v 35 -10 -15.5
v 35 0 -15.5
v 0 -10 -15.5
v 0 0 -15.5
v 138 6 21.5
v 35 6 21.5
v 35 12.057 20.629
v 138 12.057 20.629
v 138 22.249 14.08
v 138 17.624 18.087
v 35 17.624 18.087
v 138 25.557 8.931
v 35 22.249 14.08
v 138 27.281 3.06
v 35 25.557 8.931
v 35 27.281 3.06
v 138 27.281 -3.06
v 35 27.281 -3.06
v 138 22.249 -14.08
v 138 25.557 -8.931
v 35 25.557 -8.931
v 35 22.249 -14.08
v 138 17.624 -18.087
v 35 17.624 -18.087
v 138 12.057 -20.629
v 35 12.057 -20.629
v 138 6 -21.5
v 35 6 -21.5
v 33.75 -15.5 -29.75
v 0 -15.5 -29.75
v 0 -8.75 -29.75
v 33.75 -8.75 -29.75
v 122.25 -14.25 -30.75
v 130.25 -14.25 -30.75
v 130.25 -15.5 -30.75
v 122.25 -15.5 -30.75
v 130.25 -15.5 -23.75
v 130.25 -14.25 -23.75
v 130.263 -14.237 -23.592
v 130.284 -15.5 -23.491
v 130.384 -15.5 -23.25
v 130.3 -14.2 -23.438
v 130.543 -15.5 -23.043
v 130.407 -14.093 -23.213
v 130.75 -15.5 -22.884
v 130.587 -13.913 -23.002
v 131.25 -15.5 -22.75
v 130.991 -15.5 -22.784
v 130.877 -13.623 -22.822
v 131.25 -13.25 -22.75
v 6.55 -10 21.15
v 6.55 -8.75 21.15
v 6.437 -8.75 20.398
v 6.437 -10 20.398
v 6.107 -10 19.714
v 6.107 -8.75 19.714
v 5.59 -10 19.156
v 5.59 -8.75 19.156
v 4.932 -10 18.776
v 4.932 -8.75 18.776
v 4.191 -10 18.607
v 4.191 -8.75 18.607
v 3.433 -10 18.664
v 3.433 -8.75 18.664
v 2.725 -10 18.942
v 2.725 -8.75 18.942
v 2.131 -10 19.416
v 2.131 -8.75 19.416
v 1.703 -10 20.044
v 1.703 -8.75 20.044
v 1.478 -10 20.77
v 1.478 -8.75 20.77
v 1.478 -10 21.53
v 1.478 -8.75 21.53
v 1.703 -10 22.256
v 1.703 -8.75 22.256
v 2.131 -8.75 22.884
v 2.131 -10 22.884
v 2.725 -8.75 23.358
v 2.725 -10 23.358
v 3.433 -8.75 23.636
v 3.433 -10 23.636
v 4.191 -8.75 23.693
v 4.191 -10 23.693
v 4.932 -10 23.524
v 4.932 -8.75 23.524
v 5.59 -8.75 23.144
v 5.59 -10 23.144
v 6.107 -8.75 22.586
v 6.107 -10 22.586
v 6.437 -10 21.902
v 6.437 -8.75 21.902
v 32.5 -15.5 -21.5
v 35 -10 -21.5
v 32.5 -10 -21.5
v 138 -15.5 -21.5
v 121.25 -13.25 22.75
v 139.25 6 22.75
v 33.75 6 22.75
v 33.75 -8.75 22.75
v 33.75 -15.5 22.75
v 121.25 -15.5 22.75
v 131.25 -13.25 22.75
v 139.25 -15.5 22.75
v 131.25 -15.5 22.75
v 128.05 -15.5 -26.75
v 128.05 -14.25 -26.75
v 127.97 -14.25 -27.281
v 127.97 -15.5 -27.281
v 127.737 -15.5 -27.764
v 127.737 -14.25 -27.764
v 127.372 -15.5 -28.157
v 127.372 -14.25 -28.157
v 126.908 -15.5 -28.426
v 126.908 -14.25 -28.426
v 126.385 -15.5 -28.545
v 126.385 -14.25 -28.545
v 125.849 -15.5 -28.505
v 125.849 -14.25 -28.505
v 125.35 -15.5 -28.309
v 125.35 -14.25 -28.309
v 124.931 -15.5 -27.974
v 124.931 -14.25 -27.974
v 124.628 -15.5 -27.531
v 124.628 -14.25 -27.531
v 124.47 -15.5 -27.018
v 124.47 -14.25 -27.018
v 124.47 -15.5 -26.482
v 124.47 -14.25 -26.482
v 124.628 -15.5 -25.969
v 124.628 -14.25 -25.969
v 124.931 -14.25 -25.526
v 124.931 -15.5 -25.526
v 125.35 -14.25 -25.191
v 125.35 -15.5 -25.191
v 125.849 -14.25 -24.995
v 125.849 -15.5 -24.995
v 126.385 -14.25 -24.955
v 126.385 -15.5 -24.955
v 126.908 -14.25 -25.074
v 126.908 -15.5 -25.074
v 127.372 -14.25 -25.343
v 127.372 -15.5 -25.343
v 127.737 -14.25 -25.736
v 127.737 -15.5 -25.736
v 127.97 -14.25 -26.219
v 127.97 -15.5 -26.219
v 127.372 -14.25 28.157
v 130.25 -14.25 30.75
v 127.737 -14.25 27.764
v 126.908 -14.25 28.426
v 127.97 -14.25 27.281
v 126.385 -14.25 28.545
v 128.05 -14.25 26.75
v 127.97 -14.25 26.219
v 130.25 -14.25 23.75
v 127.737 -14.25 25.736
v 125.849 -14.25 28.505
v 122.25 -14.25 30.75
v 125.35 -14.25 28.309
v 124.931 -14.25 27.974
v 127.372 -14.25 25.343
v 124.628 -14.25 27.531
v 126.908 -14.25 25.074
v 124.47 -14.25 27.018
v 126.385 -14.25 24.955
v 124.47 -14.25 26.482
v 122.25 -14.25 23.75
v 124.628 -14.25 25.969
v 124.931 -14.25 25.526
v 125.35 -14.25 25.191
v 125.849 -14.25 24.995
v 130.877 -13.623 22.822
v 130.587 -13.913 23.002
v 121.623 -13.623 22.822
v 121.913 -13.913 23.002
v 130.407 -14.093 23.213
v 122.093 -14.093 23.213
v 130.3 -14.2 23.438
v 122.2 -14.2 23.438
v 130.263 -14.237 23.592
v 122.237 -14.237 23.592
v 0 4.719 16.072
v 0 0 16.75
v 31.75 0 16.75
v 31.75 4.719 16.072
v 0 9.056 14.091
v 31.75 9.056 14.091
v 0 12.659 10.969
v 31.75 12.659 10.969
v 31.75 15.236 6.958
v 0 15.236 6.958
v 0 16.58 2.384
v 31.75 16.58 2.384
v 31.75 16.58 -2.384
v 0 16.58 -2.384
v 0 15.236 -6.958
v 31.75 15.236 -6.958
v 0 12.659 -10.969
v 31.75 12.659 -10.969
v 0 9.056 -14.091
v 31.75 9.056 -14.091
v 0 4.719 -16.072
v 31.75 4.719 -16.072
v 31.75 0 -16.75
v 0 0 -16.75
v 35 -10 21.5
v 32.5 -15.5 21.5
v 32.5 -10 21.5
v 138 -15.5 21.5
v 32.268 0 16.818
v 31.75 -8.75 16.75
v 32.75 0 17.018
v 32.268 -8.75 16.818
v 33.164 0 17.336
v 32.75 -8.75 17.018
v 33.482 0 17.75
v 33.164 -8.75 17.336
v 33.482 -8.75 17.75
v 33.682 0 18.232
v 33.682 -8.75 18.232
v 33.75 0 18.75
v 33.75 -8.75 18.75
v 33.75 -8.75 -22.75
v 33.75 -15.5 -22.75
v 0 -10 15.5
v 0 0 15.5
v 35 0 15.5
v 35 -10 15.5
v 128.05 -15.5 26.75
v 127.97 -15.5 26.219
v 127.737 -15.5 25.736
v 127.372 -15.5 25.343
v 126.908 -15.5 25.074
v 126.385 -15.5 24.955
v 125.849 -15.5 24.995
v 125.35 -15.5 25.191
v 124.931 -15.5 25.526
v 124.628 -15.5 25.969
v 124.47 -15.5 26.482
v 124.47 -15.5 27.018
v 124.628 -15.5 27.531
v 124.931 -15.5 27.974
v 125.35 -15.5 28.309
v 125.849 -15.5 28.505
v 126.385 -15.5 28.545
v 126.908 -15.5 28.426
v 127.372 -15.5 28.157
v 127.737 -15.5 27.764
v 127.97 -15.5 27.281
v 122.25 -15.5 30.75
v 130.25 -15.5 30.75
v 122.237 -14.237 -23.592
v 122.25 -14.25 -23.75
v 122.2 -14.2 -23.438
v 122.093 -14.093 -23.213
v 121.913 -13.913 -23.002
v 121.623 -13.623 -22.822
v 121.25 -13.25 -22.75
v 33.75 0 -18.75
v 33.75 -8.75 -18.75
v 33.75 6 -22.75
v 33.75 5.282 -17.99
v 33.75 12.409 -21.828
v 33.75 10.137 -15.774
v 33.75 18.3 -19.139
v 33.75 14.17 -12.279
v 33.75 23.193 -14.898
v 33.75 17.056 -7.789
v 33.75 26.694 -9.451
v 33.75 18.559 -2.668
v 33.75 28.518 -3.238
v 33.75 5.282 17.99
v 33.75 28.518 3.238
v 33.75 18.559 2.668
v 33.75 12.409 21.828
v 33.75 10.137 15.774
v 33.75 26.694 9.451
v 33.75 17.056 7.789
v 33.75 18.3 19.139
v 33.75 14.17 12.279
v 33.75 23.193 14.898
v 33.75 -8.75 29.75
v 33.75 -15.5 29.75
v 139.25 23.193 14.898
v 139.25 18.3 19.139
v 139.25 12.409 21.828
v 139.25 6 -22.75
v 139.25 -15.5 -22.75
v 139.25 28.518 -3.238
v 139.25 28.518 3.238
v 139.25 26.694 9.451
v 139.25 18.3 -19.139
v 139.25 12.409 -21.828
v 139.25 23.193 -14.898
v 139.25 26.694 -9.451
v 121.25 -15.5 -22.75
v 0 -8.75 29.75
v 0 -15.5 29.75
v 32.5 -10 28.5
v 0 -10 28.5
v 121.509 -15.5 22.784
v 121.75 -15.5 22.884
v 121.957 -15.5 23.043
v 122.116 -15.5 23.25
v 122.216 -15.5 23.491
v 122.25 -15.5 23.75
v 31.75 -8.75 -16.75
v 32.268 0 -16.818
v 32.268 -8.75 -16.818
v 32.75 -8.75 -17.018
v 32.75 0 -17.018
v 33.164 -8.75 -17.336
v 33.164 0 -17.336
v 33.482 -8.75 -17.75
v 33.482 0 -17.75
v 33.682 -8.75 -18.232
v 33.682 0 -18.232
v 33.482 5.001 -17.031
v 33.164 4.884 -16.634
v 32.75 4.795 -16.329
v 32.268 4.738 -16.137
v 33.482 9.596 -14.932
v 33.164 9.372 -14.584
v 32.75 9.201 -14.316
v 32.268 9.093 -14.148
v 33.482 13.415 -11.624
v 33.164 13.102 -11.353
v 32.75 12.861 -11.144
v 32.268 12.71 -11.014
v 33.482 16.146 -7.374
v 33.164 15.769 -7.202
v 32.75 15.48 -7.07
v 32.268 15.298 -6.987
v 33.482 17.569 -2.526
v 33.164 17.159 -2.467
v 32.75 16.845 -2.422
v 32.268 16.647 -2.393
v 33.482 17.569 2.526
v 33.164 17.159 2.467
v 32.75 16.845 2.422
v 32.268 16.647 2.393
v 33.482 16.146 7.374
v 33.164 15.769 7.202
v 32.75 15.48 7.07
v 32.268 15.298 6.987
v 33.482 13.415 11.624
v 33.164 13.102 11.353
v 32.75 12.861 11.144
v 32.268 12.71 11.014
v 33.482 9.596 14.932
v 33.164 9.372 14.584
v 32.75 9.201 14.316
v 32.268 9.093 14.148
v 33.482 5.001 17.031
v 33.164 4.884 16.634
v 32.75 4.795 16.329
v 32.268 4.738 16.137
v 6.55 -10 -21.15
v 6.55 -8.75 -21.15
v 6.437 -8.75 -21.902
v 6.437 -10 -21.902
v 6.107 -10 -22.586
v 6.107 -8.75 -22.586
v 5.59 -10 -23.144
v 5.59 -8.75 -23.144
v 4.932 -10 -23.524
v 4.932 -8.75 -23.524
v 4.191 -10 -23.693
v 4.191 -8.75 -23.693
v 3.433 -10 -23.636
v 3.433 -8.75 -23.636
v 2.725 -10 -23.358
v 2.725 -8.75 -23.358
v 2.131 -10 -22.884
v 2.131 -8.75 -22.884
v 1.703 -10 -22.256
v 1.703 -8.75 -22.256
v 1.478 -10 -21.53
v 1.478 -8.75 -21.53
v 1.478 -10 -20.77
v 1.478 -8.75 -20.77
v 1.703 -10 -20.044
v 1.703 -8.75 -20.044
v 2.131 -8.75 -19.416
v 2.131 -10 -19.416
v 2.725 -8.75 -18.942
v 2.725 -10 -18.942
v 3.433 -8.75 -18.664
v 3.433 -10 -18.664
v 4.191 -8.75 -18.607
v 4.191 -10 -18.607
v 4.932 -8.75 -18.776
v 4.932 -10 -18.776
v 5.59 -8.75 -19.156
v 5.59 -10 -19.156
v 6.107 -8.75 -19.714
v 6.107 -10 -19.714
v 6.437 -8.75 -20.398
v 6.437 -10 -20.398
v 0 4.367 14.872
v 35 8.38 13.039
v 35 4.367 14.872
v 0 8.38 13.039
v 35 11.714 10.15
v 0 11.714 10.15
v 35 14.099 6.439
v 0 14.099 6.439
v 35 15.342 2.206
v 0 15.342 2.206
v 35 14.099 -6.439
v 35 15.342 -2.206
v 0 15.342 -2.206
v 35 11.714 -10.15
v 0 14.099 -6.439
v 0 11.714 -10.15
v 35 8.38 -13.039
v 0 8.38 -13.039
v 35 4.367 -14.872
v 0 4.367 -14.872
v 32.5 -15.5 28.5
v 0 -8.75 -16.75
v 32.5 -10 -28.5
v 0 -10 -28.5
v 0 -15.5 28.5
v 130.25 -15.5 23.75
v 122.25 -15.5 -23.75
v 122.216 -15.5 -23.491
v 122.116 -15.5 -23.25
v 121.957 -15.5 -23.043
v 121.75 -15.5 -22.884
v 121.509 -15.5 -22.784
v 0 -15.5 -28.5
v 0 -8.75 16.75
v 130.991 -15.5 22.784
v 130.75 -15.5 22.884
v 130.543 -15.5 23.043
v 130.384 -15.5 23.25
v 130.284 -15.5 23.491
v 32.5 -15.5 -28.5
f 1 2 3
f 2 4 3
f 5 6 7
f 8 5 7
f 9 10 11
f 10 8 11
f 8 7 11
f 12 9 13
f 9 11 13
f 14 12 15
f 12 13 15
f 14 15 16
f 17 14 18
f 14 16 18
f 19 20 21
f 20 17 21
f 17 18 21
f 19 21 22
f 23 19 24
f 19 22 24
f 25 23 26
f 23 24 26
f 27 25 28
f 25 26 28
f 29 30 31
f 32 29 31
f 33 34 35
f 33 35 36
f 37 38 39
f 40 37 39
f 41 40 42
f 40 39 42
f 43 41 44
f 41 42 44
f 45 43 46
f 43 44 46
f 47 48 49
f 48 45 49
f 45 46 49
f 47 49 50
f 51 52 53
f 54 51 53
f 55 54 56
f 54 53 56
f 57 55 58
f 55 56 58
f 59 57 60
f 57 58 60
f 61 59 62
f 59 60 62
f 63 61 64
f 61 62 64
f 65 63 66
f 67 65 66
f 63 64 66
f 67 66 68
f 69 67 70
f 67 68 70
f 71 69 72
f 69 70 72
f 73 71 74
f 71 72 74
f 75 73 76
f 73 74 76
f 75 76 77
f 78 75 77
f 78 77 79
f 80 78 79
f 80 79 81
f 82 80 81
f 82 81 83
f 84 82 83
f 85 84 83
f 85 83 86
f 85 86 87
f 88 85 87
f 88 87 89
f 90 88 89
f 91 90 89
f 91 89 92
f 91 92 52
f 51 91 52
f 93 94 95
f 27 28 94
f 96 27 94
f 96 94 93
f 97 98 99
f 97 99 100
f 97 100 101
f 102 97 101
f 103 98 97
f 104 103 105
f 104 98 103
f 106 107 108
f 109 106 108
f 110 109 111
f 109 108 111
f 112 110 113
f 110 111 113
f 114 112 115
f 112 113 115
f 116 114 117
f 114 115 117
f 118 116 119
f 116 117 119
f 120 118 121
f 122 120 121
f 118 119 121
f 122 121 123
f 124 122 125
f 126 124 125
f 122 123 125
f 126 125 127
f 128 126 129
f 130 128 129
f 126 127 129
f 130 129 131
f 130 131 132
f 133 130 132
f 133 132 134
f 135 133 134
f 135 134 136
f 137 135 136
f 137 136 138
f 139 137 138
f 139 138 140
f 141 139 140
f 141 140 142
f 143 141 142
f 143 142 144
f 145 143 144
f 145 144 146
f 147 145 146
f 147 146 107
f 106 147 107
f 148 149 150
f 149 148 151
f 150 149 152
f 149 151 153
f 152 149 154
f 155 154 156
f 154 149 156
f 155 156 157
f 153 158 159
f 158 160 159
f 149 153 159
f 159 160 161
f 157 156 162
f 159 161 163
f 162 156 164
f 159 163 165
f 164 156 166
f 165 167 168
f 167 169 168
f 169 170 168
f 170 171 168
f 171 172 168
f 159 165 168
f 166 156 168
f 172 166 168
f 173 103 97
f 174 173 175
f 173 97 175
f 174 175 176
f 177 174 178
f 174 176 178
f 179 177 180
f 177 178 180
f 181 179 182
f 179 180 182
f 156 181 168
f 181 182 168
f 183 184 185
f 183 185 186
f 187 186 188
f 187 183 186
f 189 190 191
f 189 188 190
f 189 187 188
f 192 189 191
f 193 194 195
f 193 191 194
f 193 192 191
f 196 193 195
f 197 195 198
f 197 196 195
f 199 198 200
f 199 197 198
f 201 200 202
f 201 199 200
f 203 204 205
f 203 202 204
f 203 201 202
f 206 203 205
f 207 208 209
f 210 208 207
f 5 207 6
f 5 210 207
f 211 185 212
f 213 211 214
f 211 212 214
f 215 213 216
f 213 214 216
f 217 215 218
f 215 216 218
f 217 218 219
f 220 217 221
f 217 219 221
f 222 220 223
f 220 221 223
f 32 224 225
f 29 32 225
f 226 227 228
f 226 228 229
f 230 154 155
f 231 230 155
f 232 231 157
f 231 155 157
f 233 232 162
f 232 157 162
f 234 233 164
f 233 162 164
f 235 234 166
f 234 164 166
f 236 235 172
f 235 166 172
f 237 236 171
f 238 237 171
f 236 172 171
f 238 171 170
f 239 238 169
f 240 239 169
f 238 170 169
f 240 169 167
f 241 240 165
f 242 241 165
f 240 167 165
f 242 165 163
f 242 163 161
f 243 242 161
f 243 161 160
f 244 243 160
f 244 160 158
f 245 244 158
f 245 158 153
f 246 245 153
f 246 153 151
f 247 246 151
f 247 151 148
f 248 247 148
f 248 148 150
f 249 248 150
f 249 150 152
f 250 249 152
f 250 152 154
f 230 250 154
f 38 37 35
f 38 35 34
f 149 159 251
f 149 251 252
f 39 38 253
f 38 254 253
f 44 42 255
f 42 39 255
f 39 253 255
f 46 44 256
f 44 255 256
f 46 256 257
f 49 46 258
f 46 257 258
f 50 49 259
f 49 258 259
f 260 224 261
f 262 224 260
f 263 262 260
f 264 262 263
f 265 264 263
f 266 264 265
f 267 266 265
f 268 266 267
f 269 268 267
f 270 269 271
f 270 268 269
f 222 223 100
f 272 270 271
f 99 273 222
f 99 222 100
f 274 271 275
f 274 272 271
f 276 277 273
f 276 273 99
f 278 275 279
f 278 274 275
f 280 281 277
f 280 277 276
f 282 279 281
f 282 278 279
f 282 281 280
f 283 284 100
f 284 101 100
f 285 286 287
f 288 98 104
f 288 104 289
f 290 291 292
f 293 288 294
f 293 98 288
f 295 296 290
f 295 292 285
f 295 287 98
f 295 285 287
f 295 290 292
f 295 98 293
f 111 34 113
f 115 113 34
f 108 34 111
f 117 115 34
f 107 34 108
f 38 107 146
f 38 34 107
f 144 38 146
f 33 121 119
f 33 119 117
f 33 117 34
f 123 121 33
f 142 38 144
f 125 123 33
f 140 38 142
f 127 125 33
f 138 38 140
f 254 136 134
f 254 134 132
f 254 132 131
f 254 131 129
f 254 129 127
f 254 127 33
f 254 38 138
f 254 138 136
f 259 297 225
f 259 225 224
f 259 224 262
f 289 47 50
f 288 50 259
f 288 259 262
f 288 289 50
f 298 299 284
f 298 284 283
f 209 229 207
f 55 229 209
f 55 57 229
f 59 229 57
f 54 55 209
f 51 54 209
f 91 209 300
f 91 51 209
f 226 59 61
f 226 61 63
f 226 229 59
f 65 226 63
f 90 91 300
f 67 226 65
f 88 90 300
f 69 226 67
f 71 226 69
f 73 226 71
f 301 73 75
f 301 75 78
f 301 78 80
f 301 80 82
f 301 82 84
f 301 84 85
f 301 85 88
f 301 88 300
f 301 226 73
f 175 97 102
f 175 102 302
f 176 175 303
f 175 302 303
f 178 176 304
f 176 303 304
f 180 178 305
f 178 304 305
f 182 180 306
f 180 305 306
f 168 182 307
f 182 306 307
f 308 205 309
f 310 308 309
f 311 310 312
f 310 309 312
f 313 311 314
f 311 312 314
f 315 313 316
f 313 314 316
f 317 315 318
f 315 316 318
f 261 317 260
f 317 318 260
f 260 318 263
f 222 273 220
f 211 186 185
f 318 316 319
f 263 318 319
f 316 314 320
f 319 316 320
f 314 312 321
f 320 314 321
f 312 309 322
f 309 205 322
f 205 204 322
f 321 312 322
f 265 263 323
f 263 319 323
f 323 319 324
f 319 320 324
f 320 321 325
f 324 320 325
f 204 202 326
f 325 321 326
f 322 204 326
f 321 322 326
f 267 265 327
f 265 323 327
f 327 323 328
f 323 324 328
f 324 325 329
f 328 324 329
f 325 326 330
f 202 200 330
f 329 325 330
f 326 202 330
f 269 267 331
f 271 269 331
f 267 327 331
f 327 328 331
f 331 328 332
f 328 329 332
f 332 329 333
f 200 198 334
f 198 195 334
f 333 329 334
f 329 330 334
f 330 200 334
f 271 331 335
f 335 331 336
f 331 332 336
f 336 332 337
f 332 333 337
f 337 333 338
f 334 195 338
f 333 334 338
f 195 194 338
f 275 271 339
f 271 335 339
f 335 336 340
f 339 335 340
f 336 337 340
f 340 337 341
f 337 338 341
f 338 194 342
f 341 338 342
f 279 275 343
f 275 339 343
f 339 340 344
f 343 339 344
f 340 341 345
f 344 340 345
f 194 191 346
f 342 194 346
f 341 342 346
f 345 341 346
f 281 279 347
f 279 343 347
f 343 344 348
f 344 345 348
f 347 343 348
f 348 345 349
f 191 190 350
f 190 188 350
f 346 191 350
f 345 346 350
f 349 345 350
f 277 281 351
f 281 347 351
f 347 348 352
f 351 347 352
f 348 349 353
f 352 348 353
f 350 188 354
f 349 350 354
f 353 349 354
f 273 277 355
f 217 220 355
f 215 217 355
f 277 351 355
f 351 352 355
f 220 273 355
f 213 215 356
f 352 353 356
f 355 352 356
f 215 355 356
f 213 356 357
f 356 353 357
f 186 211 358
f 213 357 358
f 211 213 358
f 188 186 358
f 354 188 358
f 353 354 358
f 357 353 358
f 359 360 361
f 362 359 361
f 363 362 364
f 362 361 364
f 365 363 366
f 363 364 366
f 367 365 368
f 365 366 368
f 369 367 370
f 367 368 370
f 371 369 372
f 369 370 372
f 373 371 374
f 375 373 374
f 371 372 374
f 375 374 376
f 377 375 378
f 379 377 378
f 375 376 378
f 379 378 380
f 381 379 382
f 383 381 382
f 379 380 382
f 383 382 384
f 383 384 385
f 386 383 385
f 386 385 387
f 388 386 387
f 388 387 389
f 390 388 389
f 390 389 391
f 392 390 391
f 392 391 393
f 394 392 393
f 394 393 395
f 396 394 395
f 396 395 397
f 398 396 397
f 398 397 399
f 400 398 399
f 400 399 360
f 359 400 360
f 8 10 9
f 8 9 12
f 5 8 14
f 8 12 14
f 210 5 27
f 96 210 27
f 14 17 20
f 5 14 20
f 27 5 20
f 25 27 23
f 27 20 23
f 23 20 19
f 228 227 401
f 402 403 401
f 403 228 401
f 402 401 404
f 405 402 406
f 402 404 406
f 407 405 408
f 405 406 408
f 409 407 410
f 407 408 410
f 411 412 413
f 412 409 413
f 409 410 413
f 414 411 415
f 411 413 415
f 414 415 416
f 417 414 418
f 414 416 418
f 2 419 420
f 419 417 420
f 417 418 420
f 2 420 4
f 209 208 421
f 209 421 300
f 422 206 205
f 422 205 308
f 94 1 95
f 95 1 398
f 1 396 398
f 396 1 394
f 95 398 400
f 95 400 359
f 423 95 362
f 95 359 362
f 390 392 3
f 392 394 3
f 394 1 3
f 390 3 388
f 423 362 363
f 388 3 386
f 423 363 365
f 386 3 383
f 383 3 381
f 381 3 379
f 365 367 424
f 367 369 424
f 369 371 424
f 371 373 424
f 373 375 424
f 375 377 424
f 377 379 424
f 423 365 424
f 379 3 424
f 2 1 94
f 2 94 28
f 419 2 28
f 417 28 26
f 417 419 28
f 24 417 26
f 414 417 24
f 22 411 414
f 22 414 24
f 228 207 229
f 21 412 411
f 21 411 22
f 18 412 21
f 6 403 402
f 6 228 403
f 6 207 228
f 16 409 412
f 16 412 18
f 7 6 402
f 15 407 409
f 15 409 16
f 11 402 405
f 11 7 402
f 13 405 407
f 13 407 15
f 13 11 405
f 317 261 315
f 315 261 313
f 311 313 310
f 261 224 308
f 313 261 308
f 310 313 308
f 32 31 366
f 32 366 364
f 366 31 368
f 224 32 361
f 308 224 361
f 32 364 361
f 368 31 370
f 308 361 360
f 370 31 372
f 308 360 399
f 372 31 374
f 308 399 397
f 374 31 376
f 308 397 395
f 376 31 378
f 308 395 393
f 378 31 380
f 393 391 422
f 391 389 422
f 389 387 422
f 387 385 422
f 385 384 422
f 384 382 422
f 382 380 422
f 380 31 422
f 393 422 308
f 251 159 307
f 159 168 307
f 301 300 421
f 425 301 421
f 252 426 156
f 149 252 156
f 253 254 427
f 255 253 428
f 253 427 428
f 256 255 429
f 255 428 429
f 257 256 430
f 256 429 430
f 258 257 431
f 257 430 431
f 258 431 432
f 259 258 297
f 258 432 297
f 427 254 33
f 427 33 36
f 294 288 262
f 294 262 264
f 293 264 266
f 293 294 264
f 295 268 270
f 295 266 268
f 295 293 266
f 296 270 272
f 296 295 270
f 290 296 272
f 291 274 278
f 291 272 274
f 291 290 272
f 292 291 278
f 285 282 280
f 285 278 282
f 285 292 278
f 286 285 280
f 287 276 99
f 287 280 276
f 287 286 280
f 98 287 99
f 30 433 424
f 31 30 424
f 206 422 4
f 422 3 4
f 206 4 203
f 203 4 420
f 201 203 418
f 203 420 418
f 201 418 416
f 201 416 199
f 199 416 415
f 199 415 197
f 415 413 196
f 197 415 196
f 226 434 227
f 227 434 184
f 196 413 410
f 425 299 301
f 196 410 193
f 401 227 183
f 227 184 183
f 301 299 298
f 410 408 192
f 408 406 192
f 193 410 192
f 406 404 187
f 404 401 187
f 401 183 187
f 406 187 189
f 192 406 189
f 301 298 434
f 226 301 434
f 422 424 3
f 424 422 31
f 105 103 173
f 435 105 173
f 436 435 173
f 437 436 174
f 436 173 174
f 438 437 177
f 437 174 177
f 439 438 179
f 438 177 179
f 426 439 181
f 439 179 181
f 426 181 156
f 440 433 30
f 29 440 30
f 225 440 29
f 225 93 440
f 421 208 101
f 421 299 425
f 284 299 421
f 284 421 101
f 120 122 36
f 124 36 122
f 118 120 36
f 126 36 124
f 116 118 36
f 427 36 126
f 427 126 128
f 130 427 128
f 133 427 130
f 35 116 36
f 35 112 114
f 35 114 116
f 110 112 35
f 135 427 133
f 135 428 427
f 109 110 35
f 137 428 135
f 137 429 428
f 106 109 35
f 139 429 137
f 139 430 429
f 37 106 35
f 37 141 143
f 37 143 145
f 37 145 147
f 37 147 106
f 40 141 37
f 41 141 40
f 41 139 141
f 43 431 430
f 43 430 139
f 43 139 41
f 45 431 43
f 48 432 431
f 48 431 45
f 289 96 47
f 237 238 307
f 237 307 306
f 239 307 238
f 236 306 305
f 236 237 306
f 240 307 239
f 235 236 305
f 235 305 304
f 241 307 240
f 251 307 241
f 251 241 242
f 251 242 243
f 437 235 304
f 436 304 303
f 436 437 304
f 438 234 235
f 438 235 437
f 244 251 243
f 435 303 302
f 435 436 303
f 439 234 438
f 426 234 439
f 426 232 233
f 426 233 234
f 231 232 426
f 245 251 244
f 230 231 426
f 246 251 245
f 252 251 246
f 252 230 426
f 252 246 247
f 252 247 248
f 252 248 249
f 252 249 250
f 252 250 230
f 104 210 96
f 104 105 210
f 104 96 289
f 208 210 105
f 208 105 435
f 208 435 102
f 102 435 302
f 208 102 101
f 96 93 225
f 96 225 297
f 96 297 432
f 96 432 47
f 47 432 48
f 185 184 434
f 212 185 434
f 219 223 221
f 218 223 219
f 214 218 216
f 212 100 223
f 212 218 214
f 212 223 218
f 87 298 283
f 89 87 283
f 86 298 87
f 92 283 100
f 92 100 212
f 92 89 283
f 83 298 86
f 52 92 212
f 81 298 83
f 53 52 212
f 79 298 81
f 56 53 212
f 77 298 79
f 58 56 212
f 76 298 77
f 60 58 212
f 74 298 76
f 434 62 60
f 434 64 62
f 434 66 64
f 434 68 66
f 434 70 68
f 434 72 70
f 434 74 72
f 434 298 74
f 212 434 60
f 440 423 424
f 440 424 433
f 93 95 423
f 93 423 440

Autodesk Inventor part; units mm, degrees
ref_plane "YZ Plane" through (0, 0, 0) normal (1, 0, 0) x (0, 1, 0)
ref_plane "XZ Plane" through (0, 0, 0) normal (0, 1, 0) x (-1, 0, 0)
ref_plane "XY Plane" through (0, 0, 0) normal (0, 0, 1) x (1, 0, 0)
sketch "Sketch1" plane through (0, 0, 0) normal (1, 0, 0) x (0, 1, 0)
  arc A0 (0, -15.5) -> (0, 15.5) centre (0, 0) ccw
  line L0 (0, -15.5) -> (-10, -15.5)
  line L1 (0, -15.5) -> (0, -16.75)
  arc A1 (0, -16.75) -> (0, 16.75) centre (0, 0) ccw
  line L2 (0, -16.75) -> (-10, -16.75)
  line L3 (-10, -15.5) -> (-10, -27.5)
  line L4 (-10, -16.75) -> (-8.75, -16.75)
  line L5 (-8.75, -27.5) -> (-8.75, -28.75)
  line L6 (-15.5, 0) -> (-15.5, -28.75)
  line L7 (-8.75, -27.5) -> (-8.75, -16.75)
  line L8 (0, 0) -> (-6.7436, 0)
  line L9 (0, 15.5) -> (-10, 15.5)
  line L10 (0, 16.75) -> (-8.75, 16.75)
  line L11 (-10, 15.5) -> (-10, 27.5)
  line L12 (-8.75, 27.5) -> (-8.75, 28.75)
  line L13 (-15.5, 0) -> (-15.5, 28.75)
  line L14 (-8.75, 27.5) -> (-8.75, 16.75)
  line L15 (-10, -27.5) -> (-10, -28.5)
  line L16 (-10, -28.5) -> (-15.5, -28.5)
  line L17 (-15.5, -28.5) -> (-15.5, -29.75)
  line L18 (-15.5, -29.75) -> (-8.75, -29.75)
  line L19 (-8.75, -29.75) -> (-8.75, -28.75)
  line L20 (-8.75, 27.5) -> (-8.75, 28.75)
  line L21 (-10, 27.5) -> (-10, 28.5)
  line L22 (-10, 28.5) -> (-15.5, 28.5)
  line L23 (-15.5, 28.5) -> (-15.5, 29.75)
  line L24 (-15.5, 29.75) -> (-8.75, 29.75)
  line L25 (-8.75, 29.75) -> (-8.75, 28.75)
  point P0 (-10, 16.75)
  dimension "d0" = 31
  dimension "d1" = 10
  dimension "d2" = 1.25
  dimension "d3" = 12
  dimension "d4" = 1.25
  dimension "d5" = 1.25
  dimension "d6" = 1
  dimension "d7" = 1.25
extrude "Extrusion1" add sketch "Sketch1" along normal blind 35 contours L1 L2 L3 L0 | A0 L9 L11 L21 L22 L13 L23 L24 L25 L12 L14 L10 A1 L1 | L2 L7 L5 L19 L18 L17 L6 L16 L15 L3
sketch "Sketch2" plane through (35, 0, 0) normal (1, 0, 0) x (0, 0, -1)
  line L0 (29.75, -8.75) -> (16.75, -8.75) projected
  line L1 (16.75, -8.75) -> (16.75, 0) projected
  arc A0 (16.75, 0) -> (-16.75, 0) centre (0, 0) ccw projected
  line L2 (-16.75, 0) -> (-16.75, -8.75) projected
  line L3 (-16.75, -8.75) -> (-29.75, -8.75) projected
  line L4 (-29.75, -8.75) -> (-29.75, -15.5) projected
  line L5 (-29.75, -15.5) -> (-28.5, -15.5) projected
  line L6 (-28.5, -15.5) -> (-28.5, -10) projected
  line L7 (-28.5, -10) -> (-15.5, -10) projected
  line L8 (-15.5, -10) -> (-15.5, 0) projected
  arc A1 (15.5, 0) -> (-15.5, 0) centre (0, 0) ccw projected
  line L9 (15.5, 0) -> (15.5, -10) projected
  line L10 (15.5, -10) -> (28.5, -10) projected
  line L11 (28.5, -10) -> (28.5, -15.5) projected
  line L12 (28.5, -15.5) -> (29.75, -15.5) projected
  line L13 (29.75, -15.5) -> (29.75, -8.75) projected
  line L14 (-28.5, -15.5) -> (-28.5, -10) projected
  line L15 (-28.5, -15.5) -> (0, -15.5)
  line L16 (0, -15.5) -> (0, 27.5)
  line L17 (0, 27.5) -> (0, 6)
  line L18 (21.5, 6) -> (21.5, -15.5)
  line L19 (21.5, -15.5) -> (22.75, -15.5)
  line L20 (22.75, -15.5) -> (22.75, 6)
  line L21 (-21.5, 6) -> (-21.5, -15.5)
  line L22 (-21.5, -15.5) -> (-22.75, -15.5)
  line L23 (-22.75, -15.5) -> (-22.75, 6)
  arc A2 (22.75, 6) -> (-22.75, 6) centre (0, 6) ccw
  arc A3 (-17.3205, -8.75) -> (-16.1729, -10) centre (0, 6) ccw
  arc A4 (16.1729, -10) -> (17.3205, -8.75) centre (0, 6) ccw
  arc A5 (-16.75, -7.4792) -> (-15.5, -8.8997) centre (0, 6) ccw
  arc A6 (15.5, -8.8997) -> (16.75, -7.4792) centre (0, 6) ccw
  arc A7 (21.5, 6) -> (-21.5, 6) centre (0, 6) ccw
  dimension "d10" = 43
  dimension "d11" = 21.5
  dimension "d12" = 1.25
extrude "Extrusion2" add sketch "Sketch2" along normal blind 103 contours L18 A7 L21 L3 L23 A2 L20 L0 | L0 L20 L10 L18 | L10 L20 L19 L18 | L3 L21 L7 L23 | L7 L21 L15 L23
sketch "Sketch3" plane through (35, 0, 0) normal (-1, 0, 0) x (0, 0, 1)
  line L0 (-22.75, -8.75) -> (-21.5, -8.75) projected
  line L1 (-21.5, 6) -> (-21.5, -8.75) projected
  arc A0 (21.5, 6) -> (-21.5, 6) centre (0, 6) ccw projected
  line L2 (21.5, -8.75) -> (21.5, 6) projected
  line L3 (21.5, -8.75) -> (22.75, -8.75) projected
  line L4 (22.75, 6) -> (22.75, -8.75) projected
  arc A1 (22.75, 6) -> (-22.75, 6) centre (0, 6) ccw projected
  line L5 (-22.75, -8.75) -> (-22.75, 6) projected
  line L6 (-29.75, -8.75) -> (-16.75, -8.75) projected
  line L7 (-29.75, -15.5) -> (-29.75, -8.75) projected
  line L8 (-28.5, -15.5) -> (-29.75, -15.5) projected
  line L9 (-28.5, -10) -> (-28.5, -15.5) projected
  line L10 (-15.5, -10) -> (-28.5, -10) projected
  line L11 (-15.5, 0) -> (-15.5, -10) projected
  arc A2 (15.5, 0) -> (-15.5, 0) centre (0, 0) ccw projected
  line L12 (15.5, -10) -> (15.5, 0) projected
  line L13 (28.5, -10) -> (15.5, -10) projected
  line L14 (28.5, -15.5) -> (28.5, -10) projected
  line L15 (29.75, -15.5) -> (28.5, -15.5) projected
  line L16 (29.75, -8.75) -> (29.75, -15.5) projected
  line L17 (16.75, -8.75) -> (29.75, -8.75) projected
  line L18 (16.75, 0) -> (16.75, -8.75) projected
  arc A3 (16.75, 0) -> (-16.75, 0) centre (0, 0) ccw projected
  line L19 (-16.75, -8.75) -> (-16.75, 0) projected
extrude "Extrusion3" add sketch "Sketch3" along normal blind 1.25 contours L5 A1 L4 L3 L2 A0 L1 L0 | L1 A0 L2 L17 L18 A3 L19 L6
sketch "Sketch4" plane through (0, -8.75, 29.75) normal (0, 1, 0) x (1, 0, 0)
  line L0 (33.75, 7) -> (33.75, 13) projected
  line L1 (0, 13) -> (33.75, 13) projected
  line L2 (0, 13) -> (0, 0) projected
  line L3 (0, 0) -> (35, 0) projected
  line L4 (35, 7) -> (35, 0) projected
  line L5 (35, 7) -> (33.75, 7) projected
  line L6 (33.75, 46.5) -> (33.75, 52.5) projected
  line L7 (33.75, 52.5) -> (35, 52.5) projected
  line L8 (35, 59.5) -> (35, 52.5) projected
  line L9 (0, 59.5) -> (35, 59.5) projected
  line L10 (0, 59.5) -> (0, 46.5) projected
  line L11 (0, 46.5) -> (33.75, 46.5) projected
  line L12 (33.75, 7) -> (33.75, 0)
  line L13 (0, 0) -> (35, 0) projected
  line L14 (33.75, 52.5) -> (33.75, 59.5)
  line L15 (0, 59.5) -> (35, 59.5) projected
  point P0 (0, 29.75)
extrude "Extrusion4" cut sketch "Sketch4" against normal through all contours L5 L4 L3 L12 | L14 L9 L8 L7
sketch "Sketch5" plane through (35, 0, 0) normal (-1, 0, 0) x (0, 0, 1)
  line L0 (-21.5, -10) -> (-22.75, -10) projected
  line L1 (-22.75, -15.5) -> (-22.75, -10) projected
  line L2 (-21.5, -15.5) -> (-22.75, -15.5) projected
  line L3 (-21.5, -10) -> (-21.5, -15.5) projected
  line L4 (22.75, -10) -> (21.5, -10) projected
  line L5 (21.5, -15.5) -> (21.5, -10) projected
  line L6 (22.75, -15.5) -> (21.5, -15.5) projected
  line L7 (22.75, -10) -> (22.75, -15.5) projected
  point P0 (0, 0)
extrude "Extrusion5" add sketch "Sketch5" along normal blind 2.5
sketch "Sketch6" plane through (138, -15.5, 22.75) normal (0, 0, 1) x (1, 0, 0)
  line L0 (-104.25, 0) -> (-104.25, 6.75) projected
  line L1 (-138, 6.75) -> (-104.25, 6.75) projected
  line L2 (-138, 6.75) -> (-138, 0) projected
  line L3 (-138, 0) -> (-104.25, 0) projected
  line L4 (-105.5, 0) -> (-105.5, 5.5) projected
  line L5 (-105.5, 5.5) -> (-104.25, 5.5) projected
  point P0 (-138, 15.5)
extrude "Extrusion6" add sketch "Sketch6" along normal blind 7 contours L3 L4 L5 L0
sketch "Sketch7" plane through (138, -15.5, -22.75) normal (0, 0, -1) x (-1, 0, 0)
  line L0 (104.25, 6.75) -> (104.25, 0) projected
  line L1 (105.5, 5.5) -> (105.5, 0) projected
  line L2 (103, 5.5) -> (105.5, 5.5) projected
  line L3 (105.5, 0) -> (0, 0) projected
  point P0 (138, 15.5)
  point P1 (104.25, 5.5)
extrude "Extrusion7" add sketch "Sketch7" along normal blind 7
sketch "Sketch8" plane through (138, 0, 0) normal (1, 0, 0) x (0, 0, -1)
  line L0 (-22.75, 6) -> (-22.75, -15.5) projected
  line L1 (-22.75, -15.5) -> (-21.5, -15.5) projected
  line L2 (-21.5, -15.5) -> (-21.5, 6) projected
  arc A0 (21.5, 6) -> (-21.5, 6) centre (0, 6) ccw projected
  line L3 (21.5, 6) -> (21.5, -15.5) projected
  line L4 (21.5, -15.5) -> (22.75, -15.5) projected
  line L5 (22.75, -15.5) -> (22.75, 6) projected
  arc A1 (22.75, 6) -> (-22.75, 6) centre (0, 6) ccw projected
  line L6 (-22.75, -15.5) -> (22.75, -15.5)
  line L7 (-21.5, -15.5) -> (-28.5, -15.5) projected
  point P0 (0, 0)
extrude "Extrusion8" add sketch "Sketch8" along normal blind 1.25
sketch "Sketch9" plane through (33.75, -8.75, 22.75) normal (0, 0, 1) x (1, 0, 0)
  line L0 (0, 0) -> (0, -6.75) projected
  line L1 (0, -6.75) -> (105.5, -6.75) projected
  line L2 (105.5, 14.75) -> (105.5, -6.75) projected
  line L3 (105.5, 14.75) -> (0, 14.75) projected
  line L4 (0, 0) -> (0, 14.75) projected
  line L5 (105.5, -6.75) -> (96.5, -6.75)
  line L6 (-1.25, -6.75) -> (104.25, -6.75) projected
  line L7 (96.5, -6.75) -> (96.5, -5.5)
  line L8 (96.5, -5.5) -> (88.5, -5.5)
  line L9 (88.5, -5.5) -> (88.5, -6.75)
  point P0 (-33.75, 8.75)
  dimension "d27" = 9
  dimension "d28" = 1.25
  dimension "d29" = 8
extrude "Extrusion9" add sketch "Sketch9" along normal blind 8 contours L9 L8 L7 L1
sketch "Sketch10" plane through (33.75, -8.75, -22.75) normal (0, 0, -1) x (-1, 0, 0)
  line L0 (-88.5, -6.75) -> (-96.5, -6.75) projected
  line L1 (-88.5, -5.5) -> (-88.5, -6.75) projected
  line L2 (-88.5, -6.75) -> (-96.5, -6.75) projected
  line L3 (-96.5, -6.75) -> (-96.5, -5.5) projected
  line L4 (-96.5, -5.5) -> (-88.5, -5.5) projected
  point P0 (33.75, 8.75)
extrude "Extrusion10" add sketch "Sketch10" along normal blind 8
sketch "Sketch11" plane through (122.25, -14.25, -22.75) normal (0, 1, 0) x (1, 0, 0)
  line L0 (8, 0) -> (0, 0) projected
  line L1 (8, 0) -> (8, 8) projected
  line L2 (0, 8) -> (8, 8) projected
  line L3 (0, 0) -> (0, 8) projected
  line L4 (0, -45.5) -> (8, -45.5) projected
  line L5 (0, -45.5) -> (0, -53.5) projected
  line L6 (8, -53.5) -> (0, -53.5) projected
  line L7 (8, -45.5) -> (8, -53.5) projected
  line L8 (0, -45.5) -> (0, -53.5) projected
  line L9 (0, -53.5) -> (4, -53.5)
  line L10 (0, -53.5) -> (8, -53.5) projected
  line L11 (4, -53.5) -> (4, -49.5)
  circle A0 centre (4, -49.5) radius 1.8
  line L12 (0, 8) -> (8, 8) projected
  line L13 (8, 8) -> (4, 8)
  line L14 (8, 8) -> (12, 8) construction
  line L15 (4, 8) -> (4, 4)
  line L16 (0, 0) -> (0, 8) projected
  circle A1 centre (4, 4) radius 1.8
  point P0 (-122.25, -22.75)
  dimension "d34" = 4
  dimension "d35" = 3.6
  dimension "d36" = 4
  dimension "d37" = 180
  dimension "d38" = 3.6
extrude "Extrusion11" cut sketch "Sketch11" against normal blind 8 contours A1 | A0
fillet "Fillet1" radius 1 6 edges at (130.25, -14.875, 22.75) (126.25, -14.25, 22.75) (122.25, -14.875, 22.75) (130.25, -14.875, -22.75) (126.25, -14.25, -22.75) (122.25, -14.875, -22.75)
fillet "Fillet2" radius 2 3 edges at (33.75, -4.375, -16.75) (33.75, -4.375, 16.75) (33.75, 16.75, 0)
sketch "Sketch12" plane through (0, -8.75, -16.75) normal (0, 1, 0) x (1, 0, 0)
  arc A0 (31.75, 0) -> (33.75, 2) centre (31.75, 2) ccw projected
  line L0 (33.75, 2) -> (33.75, 6) projected
  line L1 (33.75, 6) -> (33.75, 13) projected
  line L2 (0, 13) -> (33.75, 13) projected
  line L3 (0, 13) -> (0, 0) projected
  line L4 (0, 0) -> (31.75, 0) projected
  arc A1 (33.75, -35.5) -> (31.75, -33.5) centre (31.75, -35.5) ccw projected
  line L5 (0, -33.5) -> (31.75, -33.5) projected
  line L6 (0, -33.5) -> (0, -46.5) projected
  line L7 (0, -46.5) -> (33.75, -46.5) projected
  line L8 (33.75, -46.5) -> (33.75, -39.5) projected
  line L9 (33.75, -39.5) -> (33.75, -35.5) projected
  line L10 (0, 13) -> (-2.5, 13)
  line L11 (-2.5, 13) -> (4, 13)
  line L12 (0, 13) -> (33.75, 13) projected
  line L13 (4, 13) -> (4, 8.75)
  line L14 (4, 8.75) -> (4, 4.4)
  circle A2 centre (4, 4.4) radius 2.55
  line L15 (0, 0) -> (0, -16.75)
  line L16 (0, -16.75) -> (16.875, -16.75)
  circle A3 centre (4, -37.9) radius 2.55
  dimension "d43" = 2.5
  dimension "d44" = 6.5
  dimension "d45" = 4.25
  dimension "d46" = 4.35
  dimension "d47" = 5.1
extrude "Extrusion12" cut sketch "Sketch12" against normal blind 8 contours A2 | A3
properties part number "carcasa_motores"
